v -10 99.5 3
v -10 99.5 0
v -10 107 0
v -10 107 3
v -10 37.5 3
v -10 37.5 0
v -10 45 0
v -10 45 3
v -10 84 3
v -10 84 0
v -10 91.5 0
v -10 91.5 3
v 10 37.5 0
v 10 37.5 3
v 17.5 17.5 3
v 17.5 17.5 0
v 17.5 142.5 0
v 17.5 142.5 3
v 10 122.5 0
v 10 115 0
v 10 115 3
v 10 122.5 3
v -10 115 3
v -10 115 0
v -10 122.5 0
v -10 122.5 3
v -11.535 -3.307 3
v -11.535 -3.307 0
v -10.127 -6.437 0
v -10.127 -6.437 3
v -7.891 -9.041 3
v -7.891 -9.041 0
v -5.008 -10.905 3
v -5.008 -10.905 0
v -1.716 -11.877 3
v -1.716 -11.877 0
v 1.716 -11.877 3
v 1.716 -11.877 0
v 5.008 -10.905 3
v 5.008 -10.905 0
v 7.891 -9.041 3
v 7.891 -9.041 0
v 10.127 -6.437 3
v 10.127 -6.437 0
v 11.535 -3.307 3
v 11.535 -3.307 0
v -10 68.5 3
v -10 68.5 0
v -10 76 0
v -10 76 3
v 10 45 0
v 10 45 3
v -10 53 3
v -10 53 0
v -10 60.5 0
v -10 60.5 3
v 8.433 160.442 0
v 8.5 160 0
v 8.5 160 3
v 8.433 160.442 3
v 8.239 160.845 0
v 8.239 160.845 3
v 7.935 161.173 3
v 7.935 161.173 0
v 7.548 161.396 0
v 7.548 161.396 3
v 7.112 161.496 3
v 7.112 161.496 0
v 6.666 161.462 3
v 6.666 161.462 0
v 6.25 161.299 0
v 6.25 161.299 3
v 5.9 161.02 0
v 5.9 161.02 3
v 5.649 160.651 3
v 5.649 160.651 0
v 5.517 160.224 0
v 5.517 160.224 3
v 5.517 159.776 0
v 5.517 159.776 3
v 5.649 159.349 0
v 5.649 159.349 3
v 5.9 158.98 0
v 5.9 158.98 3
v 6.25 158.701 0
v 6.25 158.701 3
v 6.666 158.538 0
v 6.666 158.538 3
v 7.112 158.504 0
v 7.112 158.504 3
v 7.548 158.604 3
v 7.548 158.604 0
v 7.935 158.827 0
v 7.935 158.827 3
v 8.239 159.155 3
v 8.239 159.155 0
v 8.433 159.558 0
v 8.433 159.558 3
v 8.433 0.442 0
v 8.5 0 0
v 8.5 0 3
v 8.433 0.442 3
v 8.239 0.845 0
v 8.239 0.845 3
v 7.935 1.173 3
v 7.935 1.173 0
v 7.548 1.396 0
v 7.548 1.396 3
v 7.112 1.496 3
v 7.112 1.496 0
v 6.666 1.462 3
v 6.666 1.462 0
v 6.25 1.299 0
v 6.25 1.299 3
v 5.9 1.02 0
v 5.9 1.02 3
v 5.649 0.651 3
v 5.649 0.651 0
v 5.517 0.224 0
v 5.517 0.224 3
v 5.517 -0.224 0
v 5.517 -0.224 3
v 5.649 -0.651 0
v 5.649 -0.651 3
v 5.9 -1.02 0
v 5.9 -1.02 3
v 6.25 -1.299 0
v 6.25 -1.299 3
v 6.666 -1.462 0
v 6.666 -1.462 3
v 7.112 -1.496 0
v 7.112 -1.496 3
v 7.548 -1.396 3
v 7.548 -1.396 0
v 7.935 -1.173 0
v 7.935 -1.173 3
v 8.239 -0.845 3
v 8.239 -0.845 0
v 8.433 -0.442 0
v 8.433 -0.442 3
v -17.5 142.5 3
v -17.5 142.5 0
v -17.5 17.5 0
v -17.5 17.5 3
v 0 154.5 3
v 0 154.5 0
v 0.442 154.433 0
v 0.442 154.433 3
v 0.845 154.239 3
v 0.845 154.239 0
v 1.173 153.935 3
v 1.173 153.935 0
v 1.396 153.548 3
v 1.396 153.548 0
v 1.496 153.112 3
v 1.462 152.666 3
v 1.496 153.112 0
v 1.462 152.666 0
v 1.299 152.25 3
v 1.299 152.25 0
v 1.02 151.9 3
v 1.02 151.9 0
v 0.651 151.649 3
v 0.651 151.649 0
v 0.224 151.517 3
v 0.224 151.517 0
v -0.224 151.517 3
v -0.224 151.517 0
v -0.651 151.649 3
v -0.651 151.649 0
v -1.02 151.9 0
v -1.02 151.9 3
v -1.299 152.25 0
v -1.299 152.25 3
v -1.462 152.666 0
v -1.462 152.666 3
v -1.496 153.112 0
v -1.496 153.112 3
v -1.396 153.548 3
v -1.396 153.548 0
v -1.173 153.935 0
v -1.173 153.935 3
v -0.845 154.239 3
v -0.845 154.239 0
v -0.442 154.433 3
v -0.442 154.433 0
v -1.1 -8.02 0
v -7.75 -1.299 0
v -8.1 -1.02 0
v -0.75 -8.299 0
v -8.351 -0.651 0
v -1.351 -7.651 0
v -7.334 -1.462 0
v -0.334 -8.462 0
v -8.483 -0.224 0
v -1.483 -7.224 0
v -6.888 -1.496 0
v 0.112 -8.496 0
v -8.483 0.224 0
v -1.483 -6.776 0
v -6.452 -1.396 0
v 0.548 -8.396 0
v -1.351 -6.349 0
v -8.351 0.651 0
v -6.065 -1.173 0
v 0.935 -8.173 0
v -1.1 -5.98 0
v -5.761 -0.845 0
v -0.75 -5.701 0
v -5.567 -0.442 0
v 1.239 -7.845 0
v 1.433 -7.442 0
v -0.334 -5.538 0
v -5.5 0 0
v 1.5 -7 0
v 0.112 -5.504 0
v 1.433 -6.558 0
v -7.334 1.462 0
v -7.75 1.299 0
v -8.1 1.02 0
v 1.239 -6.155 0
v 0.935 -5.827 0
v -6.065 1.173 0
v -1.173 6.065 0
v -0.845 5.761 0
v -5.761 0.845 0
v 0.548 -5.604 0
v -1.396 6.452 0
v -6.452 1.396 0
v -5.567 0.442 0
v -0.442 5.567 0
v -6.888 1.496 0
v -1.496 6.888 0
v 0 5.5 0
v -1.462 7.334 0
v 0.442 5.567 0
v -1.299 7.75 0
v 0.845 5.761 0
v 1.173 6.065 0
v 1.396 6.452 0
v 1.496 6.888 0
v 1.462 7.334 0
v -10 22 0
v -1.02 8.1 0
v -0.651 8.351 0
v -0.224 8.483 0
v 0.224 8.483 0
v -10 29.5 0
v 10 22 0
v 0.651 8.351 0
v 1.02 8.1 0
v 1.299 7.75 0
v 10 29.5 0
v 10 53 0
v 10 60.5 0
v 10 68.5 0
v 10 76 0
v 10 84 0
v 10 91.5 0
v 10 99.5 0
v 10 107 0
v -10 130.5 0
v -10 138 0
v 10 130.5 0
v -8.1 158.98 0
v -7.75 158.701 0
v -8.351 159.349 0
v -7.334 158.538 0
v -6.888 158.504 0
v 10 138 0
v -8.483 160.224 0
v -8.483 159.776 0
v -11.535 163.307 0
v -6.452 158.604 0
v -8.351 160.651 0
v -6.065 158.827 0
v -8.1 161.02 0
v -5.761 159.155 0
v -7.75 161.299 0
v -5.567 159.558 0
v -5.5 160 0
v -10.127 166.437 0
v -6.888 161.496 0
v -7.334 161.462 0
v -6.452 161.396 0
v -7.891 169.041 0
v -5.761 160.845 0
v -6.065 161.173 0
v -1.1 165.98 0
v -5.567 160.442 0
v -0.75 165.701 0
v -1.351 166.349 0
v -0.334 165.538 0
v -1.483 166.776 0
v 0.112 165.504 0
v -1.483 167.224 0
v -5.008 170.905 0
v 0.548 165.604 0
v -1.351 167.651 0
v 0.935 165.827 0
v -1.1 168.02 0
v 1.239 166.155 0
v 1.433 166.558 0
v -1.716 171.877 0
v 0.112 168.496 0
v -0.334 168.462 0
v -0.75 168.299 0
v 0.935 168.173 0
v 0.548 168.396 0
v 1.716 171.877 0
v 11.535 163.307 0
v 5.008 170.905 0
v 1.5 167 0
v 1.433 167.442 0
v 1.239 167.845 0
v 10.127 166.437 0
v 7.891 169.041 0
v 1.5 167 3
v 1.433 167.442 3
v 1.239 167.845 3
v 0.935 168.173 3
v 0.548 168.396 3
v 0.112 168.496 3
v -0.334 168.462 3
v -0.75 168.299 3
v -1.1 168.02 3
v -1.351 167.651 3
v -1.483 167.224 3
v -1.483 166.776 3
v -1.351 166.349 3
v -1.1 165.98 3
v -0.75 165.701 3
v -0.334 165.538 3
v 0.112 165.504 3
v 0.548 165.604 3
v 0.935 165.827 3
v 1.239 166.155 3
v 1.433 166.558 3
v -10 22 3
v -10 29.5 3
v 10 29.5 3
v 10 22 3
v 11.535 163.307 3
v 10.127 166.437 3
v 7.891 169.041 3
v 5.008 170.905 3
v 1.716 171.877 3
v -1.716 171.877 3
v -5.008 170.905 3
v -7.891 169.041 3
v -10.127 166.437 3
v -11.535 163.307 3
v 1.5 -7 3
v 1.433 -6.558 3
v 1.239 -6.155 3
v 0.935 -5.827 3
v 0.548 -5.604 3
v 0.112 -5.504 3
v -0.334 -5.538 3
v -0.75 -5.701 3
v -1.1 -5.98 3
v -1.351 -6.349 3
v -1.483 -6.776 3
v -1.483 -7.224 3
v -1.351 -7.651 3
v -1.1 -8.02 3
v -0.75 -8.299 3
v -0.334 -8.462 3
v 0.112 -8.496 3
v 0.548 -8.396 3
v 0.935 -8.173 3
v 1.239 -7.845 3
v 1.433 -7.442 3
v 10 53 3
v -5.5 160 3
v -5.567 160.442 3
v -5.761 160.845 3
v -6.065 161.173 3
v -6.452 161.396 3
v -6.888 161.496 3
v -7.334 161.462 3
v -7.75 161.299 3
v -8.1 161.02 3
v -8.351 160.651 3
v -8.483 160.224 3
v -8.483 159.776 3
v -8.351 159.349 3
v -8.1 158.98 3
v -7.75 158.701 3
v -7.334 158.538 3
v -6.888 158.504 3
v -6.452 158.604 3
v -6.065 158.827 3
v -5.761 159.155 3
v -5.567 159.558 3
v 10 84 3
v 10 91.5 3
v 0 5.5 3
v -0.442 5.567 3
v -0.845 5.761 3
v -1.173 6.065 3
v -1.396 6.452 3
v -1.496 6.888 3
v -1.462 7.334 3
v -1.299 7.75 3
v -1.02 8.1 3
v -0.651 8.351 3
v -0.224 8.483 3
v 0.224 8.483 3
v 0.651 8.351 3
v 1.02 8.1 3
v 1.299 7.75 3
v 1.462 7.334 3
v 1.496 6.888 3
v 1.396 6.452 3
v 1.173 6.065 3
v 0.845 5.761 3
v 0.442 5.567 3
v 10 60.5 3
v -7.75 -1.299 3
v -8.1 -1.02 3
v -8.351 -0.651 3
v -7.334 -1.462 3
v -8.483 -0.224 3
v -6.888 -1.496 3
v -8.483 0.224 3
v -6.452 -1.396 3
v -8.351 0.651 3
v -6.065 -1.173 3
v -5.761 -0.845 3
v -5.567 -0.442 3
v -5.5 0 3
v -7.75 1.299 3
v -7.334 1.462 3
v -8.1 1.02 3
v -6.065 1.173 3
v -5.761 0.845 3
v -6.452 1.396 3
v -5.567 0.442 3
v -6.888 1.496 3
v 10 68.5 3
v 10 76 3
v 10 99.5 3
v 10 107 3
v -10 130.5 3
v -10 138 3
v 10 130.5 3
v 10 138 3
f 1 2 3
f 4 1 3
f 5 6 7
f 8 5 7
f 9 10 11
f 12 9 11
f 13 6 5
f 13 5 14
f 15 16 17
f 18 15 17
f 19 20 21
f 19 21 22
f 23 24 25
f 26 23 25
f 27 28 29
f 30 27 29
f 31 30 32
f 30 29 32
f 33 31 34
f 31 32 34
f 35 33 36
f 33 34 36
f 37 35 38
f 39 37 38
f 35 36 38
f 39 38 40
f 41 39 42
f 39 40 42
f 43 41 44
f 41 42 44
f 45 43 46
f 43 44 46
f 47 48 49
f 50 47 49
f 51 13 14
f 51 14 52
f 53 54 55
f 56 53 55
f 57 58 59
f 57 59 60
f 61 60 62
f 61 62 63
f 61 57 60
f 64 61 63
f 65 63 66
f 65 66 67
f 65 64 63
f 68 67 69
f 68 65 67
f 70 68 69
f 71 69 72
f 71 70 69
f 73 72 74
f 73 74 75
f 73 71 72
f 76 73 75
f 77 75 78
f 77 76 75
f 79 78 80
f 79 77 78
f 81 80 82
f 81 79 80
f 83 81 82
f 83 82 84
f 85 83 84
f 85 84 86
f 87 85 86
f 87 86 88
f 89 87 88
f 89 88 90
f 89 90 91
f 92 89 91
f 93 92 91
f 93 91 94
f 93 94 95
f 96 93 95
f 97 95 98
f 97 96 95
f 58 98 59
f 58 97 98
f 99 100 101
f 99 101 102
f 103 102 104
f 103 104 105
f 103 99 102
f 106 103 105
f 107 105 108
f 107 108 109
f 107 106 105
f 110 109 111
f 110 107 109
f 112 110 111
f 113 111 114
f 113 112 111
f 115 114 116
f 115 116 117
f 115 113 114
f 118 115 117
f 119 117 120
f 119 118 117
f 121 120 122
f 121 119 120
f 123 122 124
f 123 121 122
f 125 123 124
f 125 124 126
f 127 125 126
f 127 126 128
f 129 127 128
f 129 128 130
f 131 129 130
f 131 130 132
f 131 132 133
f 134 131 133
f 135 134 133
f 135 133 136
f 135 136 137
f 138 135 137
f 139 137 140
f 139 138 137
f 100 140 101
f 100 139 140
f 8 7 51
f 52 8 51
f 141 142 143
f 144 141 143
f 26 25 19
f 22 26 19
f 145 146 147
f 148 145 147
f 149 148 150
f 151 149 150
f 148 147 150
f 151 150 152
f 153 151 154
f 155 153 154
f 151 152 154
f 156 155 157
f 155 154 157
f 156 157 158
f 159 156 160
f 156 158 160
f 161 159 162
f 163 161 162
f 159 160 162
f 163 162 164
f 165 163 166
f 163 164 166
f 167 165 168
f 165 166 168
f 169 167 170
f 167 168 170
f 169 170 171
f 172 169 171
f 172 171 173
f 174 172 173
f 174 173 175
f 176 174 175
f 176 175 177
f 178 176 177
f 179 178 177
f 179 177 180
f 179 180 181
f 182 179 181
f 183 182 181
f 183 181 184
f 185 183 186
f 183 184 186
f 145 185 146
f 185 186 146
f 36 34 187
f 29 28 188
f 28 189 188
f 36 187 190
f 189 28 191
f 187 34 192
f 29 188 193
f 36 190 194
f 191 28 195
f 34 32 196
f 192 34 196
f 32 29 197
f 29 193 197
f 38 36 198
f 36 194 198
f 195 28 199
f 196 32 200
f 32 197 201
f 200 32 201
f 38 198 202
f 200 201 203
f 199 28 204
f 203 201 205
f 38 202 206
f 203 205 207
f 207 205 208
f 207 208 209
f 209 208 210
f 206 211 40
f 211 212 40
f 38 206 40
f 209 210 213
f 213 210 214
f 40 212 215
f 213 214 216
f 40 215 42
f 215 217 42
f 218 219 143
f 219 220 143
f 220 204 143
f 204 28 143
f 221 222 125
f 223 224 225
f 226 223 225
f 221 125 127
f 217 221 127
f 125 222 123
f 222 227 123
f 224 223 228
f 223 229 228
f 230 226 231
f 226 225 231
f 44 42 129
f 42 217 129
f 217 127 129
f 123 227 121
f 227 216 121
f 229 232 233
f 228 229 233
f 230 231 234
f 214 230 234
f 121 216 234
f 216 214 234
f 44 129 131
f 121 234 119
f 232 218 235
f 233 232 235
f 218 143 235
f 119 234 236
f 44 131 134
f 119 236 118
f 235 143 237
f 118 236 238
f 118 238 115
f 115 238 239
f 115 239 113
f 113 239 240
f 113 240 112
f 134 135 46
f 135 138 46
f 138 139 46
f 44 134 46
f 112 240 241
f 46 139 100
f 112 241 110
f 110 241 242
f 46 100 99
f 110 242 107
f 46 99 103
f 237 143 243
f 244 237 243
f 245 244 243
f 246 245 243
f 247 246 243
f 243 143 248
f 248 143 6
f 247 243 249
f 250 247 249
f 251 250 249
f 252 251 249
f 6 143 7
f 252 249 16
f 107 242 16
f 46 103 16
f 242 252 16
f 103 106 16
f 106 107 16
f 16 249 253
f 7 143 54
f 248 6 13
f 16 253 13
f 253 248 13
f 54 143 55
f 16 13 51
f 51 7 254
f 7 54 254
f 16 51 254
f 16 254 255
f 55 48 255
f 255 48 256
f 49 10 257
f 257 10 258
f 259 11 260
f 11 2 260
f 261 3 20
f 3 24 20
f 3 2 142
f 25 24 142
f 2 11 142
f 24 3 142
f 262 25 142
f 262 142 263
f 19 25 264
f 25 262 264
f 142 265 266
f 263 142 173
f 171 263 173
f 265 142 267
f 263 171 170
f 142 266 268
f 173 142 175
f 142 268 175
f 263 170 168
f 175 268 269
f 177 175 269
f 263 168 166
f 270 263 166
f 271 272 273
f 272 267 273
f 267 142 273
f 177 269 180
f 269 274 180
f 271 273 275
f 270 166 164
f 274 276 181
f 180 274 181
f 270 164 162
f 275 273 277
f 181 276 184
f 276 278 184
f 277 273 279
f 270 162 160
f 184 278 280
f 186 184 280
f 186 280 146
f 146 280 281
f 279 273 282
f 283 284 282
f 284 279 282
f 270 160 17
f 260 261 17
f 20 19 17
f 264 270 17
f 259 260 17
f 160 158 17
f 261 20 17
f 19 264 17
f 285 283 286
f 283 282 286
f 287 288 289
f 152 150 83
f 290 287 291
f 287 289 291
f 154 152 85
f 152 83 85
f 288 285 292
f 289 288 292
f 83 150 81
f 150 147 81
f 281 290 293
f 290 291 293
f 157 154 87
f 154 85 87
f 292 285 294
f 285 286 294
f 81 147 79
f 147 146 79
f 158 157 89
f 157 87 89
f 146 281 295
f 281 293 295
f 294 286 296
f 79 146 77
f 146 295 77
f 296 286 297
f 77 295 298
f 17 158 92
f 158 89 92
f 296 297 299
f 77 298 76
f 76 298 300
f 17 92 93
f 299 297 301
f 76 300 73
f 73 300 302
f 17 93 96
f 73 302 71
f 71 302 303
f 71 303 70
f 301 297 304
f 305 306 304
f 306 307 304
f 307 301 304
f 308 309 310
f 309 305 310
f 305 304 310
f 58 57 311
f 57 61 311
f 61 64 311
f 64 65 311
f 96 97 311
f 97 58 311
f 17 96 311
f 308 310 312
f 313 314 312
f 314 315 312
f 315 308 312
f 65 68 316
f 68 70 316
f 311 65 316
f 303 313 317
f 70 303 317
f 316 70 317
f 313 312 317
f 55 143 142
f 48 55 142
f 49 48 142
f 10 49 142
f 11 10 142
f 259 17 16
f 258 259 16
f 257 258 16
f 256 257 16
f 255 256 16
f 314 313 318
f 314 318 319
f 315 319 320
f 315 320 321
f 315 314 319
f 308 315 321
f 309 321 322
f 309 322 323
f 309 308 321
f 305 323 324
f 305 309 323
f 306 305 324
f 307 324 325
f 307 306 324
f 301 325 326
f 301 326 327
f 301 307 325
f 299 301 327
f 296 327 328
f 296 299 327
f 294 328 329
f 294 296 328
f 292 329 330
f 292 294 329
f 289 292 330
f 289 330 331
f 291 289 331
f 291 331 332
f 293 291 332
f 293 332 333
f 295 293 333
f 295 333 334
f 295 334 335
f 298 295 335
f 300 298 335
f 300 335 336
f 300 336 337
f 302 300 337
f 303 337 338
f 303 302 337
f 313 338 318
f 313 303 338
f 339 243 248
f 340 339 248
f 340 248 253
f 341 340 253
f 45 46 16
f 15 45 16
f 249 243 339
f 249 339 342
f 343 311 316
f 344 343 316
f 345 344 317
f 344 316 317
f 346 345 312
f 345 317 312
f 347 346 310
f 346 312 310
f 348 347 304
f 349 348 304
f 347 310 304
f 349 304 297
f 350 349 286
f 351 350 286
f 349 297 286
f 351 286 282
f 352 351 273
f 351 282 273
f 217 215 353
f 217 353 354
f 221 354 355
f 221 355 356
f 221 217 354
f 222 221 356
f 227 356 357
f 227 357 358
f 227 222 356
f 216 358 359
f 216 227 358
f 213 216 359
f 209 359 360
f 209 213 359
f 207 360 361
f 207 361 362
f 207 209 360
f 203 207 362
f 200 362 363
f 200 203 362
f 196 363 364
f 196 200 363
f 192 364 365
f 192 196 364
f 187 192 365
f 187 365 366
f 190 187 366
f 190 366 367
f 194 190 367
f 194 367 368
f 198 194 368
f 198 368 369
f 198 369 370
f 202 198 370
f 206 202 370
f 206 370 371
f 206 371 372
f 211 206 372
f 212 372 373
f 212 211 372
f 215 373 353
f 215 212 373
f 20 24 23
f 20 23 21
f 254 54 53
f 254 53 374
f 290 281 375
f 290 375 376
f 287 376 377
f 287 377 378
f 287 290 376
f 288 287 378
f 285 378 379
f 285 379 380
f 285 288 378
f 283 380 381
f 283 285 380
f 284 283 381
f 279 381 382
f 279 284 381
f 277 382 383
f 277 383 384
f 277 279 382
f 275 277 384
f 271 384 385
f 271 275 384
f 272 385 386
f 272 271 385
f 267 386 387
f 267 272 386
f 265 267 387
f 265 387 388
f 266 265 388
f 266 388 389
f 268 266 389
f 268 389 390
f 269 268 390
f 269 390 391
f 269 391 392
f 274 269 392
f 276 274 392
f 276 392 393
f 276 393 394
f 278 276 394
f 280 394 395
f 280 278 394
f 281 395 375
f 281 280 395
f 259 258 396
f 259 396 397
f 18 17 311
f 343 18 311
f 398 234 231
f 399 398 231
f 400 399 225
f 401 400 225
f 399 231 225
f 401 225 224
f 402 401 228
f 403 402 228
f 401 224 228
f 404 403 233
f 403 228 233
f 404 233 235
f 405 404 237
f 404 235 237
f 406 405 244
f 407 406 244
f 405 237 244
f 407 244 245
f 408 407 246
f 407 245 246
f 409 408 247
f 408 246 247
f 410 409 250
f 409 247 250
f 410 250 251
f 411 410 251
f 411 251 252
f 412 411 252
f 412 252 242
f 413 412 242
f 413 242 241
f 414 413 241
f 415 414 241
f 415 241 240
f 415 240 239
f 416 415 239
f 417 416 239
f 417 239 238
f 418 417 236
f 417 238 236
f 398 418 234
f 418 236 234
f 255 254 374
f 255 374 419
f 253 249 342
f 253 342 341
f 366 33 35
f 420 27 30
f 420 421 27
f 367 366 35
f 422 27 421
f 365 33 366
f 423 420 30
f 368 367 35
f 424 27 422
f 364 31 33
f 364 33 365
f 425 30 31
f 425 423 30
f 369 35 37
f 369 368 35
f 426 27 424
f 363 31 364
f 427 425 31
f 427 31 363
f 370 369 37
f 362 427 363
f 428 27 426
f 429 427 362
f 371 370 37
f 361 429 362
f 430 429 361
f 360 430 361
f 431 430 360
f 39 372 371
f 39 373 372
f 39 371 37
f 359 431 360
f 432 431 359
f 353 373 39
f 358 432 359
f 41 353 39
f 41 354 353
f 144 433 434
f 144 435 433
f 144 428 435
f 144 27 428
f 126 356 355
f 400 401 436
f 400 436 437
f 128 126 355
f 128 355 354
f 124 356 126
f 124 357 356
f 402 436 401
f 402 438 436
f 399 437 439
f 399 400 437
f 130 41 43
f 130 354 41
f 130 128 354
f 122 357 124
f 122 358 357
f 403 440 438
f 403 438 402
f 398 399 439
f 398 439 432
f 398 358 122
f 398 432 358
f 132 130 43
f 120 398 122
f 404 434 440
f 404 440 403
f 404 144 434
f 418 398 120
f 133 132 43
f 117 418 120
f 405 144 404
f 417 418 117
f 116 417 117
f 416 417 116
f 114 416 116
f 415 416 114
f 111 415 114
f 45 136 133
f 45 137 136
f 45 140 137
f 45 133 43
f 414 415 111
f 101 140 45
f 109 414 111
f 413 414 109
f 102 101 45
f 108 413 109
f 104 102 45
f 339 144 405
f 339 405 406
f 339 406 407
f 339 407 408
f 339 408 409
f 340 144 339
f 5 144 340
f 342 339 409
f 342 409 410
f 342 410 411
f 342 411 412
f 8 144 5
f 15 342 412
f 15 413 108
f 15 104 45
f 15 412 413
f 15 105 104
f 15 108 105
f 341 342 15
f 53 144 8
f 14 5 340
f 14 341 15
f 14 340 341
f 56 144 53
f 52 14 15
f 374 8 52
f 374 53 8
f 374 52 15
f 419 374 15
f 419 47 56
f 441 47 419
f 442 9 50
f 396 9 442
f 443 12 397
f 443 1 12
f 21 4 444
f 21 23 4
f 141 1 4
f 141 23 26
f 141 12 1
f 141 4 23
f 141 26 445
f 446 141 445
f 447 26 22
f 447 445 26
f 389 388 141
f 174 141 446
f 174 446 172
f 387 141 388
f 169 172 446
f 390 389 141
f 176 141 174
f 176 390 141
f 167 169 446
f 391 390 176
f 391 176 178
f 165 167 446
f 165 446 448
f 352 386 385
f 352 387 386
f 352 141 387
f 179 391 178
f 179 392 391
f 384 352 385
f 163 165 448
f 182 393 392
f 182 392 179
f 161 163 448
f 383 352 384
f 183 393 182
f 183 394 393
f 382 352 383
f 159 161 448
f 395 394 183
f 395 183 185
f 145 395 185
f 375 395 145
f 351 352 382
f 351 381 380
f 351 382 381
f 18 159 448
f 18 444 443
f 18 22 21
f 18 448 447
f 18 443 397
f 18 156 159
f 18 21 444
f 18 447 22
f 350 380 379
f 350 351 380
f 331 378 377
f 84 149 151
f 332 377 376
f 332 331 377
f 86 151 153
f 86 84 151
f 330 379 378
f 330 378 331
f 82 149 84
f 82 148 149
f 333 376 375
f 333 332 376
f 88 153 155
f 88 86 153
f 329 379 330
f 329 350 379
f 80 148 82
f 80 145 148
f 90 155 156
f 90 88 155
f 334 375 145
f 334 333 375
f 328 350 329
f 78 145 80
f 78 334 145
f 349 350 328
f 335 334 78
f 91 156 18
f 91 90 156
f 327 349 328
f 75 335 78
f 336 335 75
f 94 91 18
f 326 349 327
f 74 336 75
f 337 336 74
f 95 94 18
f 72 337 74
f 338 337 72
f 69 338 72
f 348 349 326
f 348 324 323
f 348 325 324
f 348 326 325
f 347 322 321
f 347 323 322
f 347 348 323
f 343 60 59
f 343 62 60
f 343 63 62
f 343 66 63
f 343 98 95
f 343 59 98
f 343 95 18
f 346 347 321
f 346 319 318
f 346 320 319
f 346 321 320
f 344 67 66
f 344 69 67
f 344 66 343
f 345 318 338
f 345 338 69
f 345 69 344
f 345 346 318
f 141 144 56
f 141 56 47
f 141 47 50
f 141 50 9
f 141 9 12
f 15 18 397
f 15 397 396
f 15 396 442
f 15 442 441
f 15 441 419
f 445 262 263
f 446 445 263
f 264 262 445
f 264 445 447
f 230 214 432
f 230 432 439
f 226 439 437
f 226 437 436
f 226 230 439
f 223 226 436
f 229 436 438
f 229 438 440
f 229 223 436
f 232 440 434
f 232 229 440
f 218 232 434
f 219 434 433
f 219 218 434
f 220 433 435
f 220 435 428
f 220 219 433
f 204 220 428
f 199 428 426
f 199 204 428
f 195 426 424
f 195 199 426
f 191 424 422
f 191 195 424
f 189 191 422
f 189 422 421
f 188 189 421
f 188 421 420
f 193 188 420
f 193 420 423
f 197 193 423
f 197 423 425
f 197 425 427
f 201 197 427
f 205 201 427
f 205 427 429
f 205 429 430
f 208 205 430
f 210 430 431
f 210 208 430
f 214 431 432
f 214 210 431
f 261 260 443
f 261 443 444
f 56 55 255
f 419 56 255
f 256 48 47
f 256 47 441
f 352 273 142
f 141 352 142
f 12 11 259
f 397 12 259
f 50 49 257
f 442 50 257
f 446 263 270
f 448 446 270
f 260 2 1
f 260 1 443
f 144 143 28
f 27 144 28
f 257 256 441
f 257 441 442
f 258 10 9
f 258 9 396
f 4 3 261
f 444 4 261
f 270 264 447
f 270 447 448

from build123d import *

# Parameters (mm, degrees)
SKETCH1_R           = 1.5
SKETCH1_W           = 20
SKETCH1_H           = 7.5
BOSS_EXTRUDE4_DEPTH = 3


with BuildPart() as part:
    # Sketch1 → Boss-Extrude4 (new body)
    with BuildSketch(Plane.XY):
        with BuildLine():
            Line((-17.5, 142.5), (-17.5, 17.5))
            Line((-17.5, 17.5), (-11.535380853, -3.306809425))
            ThreePointArc((-11.535380853, -3.306809425), (0, -12), (11.535380853, -3.306809425))
            Line((11.535380853, -3.306809425), (17.5, 17.5))
            Line((17.5, 17.5), (17.5, 142.5))
            Line((17.5, 142.5), (11.535380853, 163.306809425))
            ThreePointArc((11.535380853, 163.306809425), (0, 172), (-11.535380853, 163.306809425))
            Line((-11.535380853, 163.306809425), (-17.5, 142.5))
        make_face()
        with Locations((-7, 0)):
            Circle(SKETCH1_R, mode=Mode.SUBTRACT)
        with Locations((0, 25.75)):
            Rectangle(SKETCH1_W, SKETCH1_H, mode=Mode.SUBTRACT)
        with Locations((0, -7)):
            Circle(SKETCH1_R, mode=Mode.SUBTRACT)
        with BuildLine():
            ThreePointArc((0, 8.5), (1.5, 7), (0, 5.5))
            ThreePointArc((0, 5.5), (-1.5, 7), (0, 8.5))
        make_face(mode=Mode.SUBTRACT)
        with Locations((7, 0)):
            Circle(SKETCH1_R, mode=Mode.SUBTRACT)
        with Locations((0, 41.25)):
            Rectangle(SKETCH1_W, SKETCH1_H, mode=Mode.SUBTRACT)
        with Locations((0, 56.75)):
            Rectangle(SKETCH1_W, SKETCH1_H, mode=Mode.SUBTRACT)
        with Locations((0, 72.25)):
            Rectangle(SKETCH1_W, SKETCH1_H, mode=Mode.SUBTRACT)
        with Locations((0, 87.75)):
            Rectangle(SKETCH1_W, SKETCH1_H, mode=Mode.SUBTRACT)
        with Locations((0, 103.25)):
            Rectangle(SKETCH1_W, SKETCH1_H, mode=Mode.SUBTRACT)
        with Locations((0, 118.75)):
            Rectangle(SKETCH1_W, SKETCH1_H, mode=Mode.SUBTRACT)
        with Locations((0, 134.25)):
            Rectangle(SKETCH1_W, SKETCH1_H, mode=Mode.SUBTRACT)
        with Locations((0, 167)):
            Circle(SKETCH1_R, mode=Mode.SUBTRACT)
        with BuildLine():
            ThreePointArc((0, 151.5), (-1.5, 153), (0, 154.5))
            ThreePointArc((0, 154.5), (1.5, 153), (0, 151.5))
        make_face(mode=Mode.SUBTRACT)
        with Locations((-7, 160)):
            Circle(SKETCH1_R, mode=Mode.SUBTRACT)
        with Locations((7, 160)):
            Circle(SKETCH1_R, mode=Mode.SUBTRACT)
    extrude(amount=BOSS_EXTRUDE4_DEPTH)


solid = part.part
